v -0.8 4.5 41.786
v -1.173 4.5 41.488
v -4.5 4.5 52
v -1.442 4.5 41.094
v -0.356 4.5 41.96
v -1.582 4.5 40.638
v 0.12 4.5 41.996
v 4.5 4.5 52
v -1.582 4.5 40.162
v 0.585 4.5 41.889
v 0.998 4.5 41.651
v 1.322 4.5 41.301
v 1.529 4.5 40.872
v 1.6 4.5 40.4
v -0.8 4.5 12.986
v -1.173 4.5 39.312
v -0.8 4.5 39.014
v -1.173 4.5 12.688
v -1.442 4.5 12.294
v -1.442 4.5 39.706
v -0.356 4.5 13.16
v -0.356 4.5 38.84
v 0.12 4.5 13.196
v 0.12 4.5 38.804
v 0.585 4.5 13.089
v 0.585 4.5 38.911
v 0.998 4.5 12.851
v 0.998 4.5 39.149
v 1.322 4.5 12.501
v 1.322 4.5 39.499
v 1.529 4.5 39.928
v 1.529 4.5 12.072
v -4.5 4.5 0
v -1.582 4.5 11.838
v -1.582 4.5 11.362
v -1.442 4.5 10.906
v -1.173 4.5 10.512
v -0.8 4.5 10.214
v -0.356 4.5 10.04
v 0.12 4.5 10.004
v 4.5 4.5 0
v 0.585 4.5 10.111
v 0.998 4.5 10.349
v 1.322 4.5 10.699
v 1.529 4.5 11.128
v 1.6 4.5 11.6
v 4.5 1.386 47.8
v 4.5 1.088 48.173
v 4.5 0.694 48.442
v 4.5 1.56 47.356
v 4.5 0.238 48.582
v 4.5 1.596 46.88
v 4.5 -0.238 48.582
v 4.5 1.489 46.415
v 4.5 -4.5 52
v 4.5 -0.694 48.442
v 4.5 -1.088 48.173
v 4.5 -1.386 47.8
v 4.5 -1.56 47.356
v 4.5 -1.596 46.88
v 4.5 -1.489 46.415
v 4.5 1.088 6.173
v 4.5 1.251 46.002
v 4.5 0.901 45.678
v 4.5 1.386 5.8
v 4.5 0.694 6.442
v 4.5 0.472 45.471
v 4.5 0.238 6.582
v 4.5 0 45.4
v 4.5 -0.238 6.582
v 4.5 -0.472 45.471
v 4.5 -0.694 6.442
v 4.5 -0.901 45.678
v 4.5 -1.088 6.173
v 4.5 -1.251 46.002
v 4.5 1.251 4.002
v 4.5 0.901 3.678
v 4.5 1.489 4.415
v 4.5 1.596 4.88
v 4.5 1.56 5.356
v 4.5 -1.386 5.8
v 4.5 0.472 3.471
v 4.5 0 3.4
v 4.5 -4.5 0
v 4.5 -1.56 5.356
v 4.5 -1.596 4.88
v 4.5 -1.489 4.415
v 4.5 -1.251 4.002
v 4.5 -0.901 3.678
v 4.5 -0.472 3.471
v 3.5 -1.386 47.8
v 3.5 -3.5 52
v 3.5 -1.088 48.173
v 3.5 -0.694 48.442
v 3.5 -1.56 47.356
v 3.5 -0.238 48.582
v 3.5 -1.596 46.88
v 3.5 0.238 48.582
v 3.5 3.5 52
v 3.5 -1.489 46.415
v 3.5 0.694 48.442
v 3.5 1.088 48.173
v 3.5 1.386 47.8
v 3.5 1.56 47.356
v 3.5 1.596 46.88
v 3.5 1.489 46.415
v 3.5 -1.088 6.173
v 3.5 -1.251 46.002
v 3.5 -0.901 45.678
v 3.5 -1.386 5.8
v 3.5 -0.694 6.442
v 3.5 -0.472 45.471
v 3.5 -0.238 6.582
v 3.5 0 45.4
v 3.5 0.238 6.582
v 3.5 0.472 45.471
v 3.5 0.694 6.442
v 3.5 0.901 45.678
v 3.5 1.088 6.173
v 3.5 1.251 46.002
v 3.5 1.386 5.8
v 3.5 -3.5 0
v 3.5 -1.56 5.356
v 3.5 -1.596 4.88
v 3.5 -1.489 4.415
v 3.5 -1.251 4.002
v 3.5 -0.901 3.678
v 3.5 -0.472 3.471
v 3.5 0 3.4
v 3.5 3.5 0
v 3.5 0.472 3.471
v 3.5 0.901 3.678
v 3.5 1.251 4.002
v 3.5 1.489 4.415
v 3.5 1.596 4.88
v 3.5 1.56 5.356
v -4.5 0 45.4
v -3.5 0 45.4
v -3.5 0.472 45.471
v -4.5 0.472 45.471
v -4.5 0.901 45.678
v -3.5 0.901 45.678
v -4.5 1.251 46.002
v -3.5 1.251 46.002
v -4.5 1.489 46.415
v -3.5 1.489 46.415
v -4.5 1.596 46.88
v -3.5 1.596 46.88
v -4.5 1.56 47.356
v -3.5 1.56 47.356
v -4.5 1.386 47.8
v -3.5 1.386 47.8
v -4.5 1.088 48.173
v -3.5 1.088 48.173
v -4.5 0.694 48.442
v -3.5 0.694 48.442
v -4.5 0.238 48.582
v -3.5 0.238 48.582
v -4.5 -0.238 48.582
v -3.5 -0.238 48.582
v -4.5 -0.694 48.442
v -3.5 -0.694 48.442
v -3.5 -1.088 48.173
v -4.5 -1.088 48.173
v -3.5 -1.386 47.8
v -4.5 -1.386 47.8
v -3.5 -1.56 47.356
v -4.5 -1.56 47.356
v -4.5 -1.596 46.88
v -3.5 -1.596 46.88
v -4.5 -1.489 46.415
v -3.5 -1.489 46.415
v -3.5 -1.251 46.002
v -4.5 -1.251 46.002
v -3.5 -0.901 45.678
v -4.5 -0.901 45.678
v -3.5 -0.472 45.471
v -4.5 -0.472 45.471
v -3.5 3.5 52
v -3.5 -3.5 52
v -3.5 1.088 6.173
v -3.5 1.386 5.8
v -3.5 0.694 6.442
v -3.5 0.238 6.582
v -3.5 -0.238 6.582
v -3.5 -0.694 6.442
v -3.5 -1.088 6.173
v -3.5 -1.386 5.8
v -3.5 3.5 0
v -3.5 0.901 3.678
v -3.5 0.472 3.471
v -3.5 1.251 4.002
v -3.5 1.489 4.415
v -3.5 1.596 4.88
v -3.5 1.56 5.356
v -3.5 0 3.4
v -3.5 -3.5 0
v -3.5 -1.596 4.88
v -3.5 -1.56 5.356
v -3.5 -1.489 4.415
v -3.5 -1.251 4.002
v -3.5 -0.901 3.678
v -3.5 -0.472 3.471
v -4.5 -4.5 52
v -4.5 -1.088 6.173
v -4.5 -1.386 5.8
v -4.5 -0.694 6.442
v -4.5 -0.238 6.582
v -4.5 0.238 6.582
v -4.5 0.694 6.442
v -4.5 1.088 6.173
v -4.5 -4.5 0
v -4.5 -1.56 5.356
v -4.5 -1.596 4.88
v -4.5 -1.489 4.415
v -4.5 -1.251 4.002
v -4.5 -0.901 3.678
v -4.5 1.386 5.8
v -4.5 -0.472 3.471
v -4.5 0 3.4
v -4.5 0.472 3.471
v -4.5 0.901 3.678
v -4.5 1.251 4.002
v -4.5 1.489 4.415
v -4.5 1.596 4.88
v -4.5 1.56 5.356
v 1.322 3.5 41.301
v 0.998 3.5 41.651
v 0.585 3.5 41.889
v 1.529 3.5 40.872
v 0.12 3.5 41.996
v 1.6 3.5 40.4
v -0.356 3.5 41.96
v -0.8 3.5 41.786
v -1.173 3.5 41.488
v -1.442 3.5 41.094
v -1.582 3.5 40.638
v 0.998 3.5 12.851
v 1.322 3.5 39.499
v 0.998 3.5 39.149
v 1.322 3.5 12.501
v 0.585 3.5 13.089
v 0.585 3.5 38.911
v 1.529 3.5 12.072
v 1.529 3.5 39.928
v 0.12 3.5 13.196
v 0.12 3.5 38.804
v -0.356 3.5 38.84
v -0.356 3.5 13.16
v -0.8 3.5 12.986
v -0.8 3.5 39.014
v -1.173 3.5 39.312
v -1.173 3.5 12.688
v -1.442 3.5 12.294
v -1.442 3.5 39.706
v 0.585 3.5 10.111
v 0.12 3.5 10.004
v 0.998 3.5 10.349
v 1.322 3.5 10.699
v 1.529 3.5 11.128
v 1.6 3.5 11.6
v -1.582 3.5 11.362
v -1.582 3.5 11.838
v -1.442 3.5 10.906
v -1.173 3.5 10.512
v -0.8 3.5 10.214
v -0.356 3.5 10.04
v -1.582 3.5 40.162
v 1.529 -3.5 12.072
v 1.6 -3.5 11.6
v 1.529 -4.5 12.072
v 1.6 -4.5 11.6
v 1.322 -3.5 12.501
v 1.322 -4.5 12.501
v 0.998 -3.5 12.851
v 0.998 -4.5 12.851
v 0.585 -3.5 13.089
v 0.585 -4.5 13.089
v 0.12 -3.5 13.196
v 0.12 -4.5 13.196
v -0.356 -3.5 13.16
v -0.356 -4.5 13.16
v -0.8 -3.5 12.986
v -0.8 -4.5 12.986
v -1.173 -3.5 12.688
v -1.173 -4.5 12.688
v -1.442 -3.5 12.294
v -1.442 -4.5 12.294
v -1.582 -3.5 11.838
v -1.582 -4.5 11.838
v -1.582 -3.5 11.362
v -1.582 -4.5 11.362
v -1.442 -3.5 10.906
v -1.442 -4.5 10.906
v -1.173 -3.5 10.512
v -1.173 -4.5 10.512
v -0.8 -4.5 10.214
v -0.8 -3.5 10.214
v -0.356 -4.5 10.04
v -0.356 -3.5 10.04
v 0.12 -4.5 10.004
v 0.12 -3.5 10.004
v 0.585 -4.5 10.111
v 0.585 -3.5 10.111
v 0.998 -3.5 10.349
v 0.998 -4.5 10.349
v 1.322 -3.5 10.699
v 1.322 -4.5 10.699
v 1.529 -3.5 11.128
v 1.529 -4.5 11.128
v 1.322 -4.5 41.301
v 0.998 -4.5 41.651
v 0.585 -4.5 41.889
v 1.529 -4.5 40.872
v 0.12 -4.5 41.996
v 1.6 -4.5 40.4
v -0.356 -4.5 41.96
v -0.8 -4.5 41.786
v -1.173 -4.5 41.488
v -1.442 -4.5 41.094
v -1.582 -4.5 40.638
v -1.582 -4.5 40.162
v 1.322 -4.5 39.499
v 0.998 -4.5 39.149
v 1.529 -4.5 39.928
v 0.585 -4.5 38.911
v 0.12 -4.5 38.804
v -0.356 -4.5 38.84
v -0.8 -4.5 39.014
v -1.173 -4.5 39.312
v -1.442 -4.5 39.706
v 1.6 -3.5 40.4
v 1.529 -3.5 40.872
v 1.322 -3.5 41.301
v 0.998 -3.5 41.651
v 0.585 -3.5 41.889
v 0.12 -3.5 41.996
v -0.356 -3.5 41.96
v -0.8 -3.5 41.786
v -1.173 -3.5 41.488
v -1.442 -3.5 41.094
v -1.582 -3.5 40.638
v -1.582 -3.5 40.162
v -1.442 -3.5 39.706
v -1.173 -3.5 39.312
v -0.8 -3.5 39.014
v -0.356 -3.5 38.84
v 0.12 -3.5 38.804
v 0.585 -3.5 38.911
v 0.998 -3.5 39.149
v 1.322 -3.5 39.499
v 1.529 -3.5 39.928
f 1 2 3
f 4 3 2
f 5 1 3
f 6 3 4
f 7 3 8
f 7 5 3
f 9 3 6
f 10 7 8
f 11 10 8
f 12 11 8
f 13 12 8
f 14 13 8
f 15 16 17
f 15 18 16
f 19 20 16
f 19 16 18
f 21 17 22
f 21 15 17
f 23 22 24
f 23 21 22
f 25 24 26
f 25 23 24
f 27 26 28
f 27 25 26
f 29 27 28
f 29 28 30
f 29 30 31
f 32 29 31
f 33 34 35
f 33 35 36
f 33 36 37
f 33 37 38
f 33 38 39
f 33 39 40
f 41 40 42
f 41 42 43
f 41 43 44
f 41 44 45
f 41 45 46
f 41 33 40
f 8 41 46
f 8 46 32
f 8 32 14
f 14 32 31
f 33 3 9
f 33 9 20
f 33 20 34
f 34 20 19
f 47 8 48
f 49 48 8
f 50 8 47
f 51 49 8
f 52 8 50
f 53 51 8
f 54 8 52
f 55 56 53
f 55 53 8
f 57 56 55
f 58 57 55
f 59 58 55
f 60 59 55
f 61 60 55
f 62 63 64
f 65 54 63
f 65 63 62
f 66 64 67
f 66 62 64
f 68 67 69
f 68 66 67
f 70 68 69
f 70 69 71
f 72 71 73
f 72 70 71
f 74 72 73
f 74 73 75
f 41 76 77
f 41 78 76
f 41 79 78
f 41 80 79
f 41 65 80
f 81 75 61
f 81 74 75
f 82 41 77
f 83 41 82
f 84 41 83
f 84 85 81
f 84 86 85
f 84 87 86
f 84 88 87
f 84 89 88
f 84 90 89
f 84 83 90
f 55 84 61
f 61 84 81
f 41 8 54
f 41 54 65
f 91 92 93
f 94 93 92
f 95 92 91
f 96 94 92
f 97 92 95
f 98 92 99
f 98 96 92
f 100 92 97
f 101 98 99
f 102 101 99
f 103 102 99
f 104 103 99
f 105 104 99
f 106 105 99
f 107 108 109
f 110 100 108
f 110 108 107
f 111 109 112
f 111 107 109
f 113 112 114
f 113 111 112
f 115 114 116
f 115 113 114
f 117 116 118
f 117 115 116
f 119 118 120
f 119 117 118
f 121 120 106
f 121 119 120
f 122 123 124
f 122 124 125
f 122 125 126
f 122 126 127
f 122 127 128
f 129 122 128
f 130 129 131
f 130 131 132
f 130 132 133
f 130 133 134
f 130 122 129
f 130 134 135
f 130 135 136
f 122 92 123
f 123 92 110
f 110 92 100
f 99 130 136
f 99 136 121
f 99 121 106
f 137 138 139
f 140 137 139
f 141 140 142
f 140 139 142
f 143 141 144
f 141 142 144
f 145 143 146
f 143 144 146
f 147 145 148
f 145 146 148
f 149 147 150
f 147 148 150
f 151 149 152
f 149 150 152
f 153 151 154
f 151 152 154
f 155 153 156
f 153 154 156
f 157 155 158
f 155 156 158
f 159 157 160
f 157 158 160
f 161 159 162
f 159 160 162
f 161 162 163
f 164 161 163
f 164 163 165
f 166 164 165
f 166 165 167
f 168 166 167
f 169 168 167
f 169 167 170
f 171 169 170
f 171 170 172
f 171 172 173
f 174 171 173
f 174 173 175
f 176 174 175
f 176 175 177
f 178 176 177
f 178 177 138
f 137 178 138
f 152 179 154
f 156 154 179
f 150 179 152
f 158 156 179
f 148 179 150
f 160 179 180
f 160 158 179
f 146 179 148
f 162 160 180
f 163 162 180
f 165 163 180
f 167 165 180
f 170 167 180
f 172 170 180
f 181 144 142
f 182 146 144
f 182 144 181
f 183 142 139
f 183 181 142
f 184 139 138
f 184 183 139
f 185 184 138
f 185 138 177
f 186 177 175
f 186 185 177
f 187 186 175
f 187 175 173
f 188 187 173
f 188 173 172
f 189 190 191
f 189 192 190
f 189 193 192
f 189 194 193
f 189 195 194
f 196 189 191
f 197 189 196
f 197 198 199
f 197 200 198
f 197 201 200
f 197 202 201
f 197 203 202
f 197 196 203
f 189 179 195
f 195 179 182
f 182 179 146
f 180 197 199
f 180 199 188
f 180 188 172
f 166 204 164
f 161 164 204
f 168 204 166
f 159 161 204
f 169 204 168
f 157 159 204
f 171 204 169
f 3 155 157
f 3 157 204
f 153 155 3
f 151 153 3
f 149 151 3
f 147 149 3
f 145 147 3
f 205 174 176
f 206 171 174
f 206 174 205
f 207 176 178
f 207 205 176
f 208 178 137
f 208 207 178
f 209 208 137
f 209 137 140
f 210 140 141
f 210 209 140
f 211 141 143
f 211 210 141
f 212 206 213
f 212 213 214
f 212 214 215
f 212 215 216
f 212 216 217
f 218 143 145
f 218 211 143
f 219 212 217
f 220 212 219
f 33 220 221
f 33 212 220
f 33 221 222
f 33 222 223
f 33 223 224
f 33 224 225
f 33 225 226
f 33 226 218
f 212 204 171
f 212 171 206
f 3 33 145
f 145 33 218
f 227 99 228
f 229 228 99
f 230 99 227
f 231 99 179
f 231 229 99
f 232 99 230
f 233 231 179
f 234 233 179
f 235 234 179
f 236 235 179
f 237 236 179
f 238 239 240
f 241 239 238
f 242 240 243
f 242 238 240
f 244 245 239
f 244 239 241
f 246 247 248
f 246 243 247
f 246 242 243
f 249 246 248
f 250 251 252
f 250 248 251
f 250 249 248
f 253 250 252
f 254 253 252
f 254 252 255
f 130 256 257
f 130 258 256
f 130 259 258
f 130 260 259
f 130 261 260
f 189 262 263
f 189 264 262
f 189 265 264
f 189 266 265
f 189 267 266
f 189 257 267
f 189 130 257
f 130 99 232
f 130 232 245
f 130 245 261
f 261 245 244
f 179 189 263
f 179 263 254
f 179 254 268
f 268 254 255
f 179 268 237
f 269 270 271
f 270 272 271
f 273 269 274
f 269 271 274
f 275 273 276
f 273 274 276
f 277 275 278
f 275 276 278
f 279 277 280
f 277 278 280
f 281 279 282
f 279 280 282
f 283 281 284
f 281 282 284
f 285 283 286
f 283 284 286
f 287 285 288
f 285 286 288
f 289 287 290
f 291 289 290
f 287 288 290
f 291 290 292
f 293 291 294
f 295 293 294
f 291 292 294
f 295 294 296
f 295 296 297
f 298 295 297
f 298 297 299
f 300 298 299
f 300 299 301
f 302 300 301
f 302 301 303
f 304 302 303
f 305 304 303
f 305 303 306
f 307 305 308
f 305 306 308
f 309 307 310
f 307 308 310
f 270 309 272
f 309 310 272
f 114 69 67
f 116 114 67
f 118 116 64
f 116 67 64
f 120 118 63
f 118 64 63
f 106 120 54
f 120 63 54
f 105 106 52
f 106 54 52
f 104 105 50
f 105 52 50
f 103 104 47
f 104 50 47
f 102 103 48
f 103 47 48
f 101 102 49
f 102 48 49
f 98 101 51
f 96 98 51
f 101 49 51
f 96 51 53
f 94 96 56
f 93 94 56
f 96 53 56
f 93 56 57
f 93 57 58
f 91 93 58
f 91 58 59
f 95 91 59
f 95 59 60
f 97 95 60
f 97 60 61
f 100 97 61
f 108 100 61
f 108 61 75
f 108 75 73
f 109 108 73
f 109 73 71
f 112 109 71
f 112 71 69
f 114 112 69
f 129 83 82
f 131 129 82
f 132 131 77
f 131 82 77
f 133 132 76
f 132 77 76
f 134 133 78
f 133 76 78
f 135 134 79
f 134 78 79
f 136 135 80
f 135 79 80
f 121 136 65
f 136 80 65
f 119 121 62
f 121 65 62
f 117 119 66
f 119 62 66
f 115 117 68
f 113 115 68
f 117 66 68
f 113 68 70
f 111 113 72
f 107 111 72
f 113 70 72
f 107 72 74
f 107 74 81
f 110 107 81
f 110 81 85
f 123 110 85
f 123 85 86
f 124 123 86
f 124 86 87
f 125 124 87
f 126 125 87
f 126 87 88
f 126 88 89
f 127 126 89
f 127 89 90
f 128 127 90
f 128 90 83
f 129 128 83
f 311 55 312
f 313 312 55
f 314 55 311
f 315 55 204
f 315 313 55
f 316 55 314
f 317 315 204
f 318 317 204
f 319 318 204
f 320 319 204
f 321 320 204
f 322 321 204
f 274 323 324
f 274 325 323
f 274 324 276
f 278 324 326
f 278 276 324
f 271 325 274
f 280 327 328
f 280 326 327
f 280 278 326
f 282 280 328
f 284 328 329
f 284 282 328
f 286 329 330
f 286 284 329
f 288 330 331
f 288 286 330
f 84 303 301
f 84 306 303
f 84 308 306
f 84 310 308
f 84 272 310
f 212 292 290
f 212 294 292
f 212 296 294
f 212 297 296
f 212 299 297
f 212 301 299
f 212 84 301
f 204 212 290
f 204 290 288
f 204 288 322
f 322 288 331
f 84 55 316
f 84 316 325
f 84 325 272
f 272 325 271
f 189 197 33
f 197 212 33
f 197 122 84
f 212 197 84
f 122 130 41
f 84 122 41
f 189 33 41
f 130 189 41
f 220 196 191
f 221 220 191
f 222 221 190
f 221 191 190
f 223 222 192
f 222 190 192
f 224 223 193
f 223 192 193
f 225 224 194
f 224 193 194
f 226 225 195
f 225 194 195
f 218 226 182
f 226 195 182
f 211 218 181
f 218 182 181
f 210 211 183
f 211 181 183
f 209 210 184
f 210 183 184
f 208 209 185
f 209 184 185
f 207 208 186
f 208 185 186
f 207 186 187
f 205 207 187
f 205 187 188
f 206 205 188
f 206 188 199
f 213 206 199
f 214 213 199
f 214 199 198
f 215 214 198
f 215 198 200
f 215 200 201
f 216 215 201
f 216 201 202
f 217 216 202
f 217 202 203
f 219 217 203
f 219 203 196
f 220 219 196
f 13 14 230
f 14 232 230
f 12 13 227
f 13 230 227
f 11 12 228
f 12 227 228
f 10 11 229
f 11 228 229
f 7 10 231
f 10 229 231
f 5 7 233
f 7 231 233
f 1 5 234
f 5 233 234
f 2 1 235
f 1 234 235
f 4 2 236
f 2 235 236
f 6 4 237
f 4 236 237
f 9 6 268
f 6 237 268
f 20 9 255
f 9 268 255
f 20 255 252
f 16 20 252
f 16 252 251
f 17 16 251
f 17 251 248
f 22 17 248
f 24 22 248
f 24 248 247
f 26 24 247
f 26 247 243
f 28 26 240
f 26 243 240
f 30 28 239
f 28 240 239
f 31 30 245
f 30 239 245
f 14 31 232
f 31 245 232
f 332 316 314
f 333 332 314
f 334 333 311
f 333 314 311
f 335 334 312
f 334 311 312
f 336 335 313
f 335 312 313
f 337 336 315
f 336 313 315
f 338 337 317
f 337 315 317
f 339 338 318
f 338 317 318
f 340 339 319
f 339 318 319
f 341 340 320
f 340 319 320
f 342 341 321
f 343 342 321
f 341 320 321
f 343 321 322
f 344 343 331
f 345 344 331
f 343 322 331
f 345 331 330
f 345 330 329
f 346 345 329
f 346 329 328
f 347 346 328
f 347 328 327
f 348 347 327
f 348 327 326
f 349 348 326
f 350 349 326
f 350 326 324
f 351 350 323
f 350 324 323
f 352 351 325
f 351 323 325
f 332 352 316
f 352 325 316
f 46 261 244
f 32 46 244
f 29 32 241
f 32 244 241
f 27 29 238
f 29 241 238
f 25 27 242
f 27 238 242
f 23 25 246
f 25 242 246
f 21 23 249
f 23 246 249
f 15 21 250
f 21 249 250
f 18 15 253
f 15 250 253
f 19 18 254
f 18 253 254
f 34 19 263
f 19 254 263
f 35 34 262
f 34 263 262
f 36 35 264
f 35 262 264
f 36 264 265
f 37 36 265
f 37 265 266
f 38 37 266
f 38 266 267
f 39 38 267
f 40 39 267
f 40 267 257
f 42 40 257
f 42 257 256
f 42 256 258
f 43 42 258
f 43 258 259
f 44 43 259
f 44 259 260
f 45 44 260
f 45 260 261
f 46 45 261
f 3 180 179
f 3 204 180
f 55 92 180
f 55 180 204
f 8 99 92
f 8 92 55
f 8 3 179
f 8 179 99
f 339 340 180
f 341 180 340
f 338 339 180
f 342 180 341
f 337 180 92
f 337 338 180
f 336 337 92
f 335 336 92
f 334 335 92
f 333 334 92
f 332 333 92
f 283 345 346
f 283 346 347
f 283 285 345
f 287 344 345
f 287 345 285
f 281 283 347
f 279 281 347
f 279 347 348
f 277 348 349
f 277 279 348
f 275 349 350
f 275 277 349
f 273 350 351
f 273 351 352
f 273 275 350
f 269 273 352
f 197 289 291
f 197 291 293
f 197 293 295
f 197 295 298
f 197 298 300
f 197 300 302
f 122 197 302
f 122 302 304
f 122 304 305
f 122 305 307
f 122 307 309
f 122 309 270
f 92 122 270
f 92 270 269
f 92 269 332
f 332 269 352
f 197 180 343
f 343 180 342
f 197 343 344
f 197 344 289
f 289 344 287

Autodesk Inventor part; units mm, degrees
ref_plane "YZ Plane" through (0, 0, 0) normal (1, 0, 0) x (0, 1, 0)
ref_plane "XZ Plane" through (0, 0, 0) normal (0, 1, 0) x (-1, 0, 0)
ref_plane "XY Plane" through (0, 0, 0) normal (0, 0, 1) x (1, 0, 0)
sketch "スケッチ1" plane through (0, 0, 0) normal (0, 0, 1) x (1, 0, 0)
  line L0 (4.5, -4.5) -> (-4.5, -4.5)
  line L1 (-4.5, -4.5) -> (-4.5, 4.5)
  line L2 (-4.5, 4.5) -> (4.5, 4.5)
  line L3 (4.5, 4.5) -> (4.5, -4.5)
  line L4 (4.5, -4.5) -> (-4.5, 4.5) construction
  line L5 (-4.5, -4.5) -> (4.5, 4.5) construction
  line L6 (3.5, 3.5) -> (-3.5, 3.5)
  line L7 (-3.5, 3.5) -> (-3.5, -3.5)
  line L8 (-3.5, -3.5) -> (3.5, -3.5)
  line L9 (3.5, -3.5) -> (3.5, 3.5)
  point P0 (0, 0)
  dimension "d0" = 9
  dimension "d1" = 9
  dimension "d2" = 1
extrude "押し出し1" add sketch "スケッチ1" along normal blind 52
sketch "スケッチ3" plane through (4.5, -4.5, 0) normal (1, 0, 0) x (0, 0, -1)
  line L0 (0, 9) -> (0, 0) projected
  line L1 (0, 9) -> (-52, 9) projected
  line L2 (-52, 0) -> (-52, 9) projected
  line L3 (0, 0) -> (-52, 0) projected
  line L4 (-52, 4.5) -> (0, 4.5) construction
  line L5 (-26, 4.5) -> (-26, 9) construction
  circle A0 centre (-47, 4.5) radius 1.6
  circle A1 centre (-5, 4.5) radius 1.6
  dimension "d9" = 3.2
  dimension "d10" = 5
extrude "押し出し3" cut sketch "スケッチ3" against normal through all contours A0 | A1
sketch "スケッチ4" plane through (-4.5, -4.5, 0) normal (0, -1, 0) x (1, 0, 0)
  line L0 (9, 0) -> (0, 0) projected
  line L1 (9, 0) -> (9, 52) projected
  line L2 (0, 52) -> (9, 52) projected
  line L3 (0, 0) -> (0, 52) projected
  line L4 (9, 48.6) -> (9, 45.4) projected
  line L5 (8, 45.4) -> (8, 48.6) projected
  line L6 (0, 48.6) -> (0, 45.4) projected
  line L7 (1, 48.6) -> (1, 45.4) projected
  line L8 (9, 6.6) -> (9, 3.4) projected
  line L9 (8, 3.4) -> (8, 6.6) projected
  line L10 (1, 6.6) -> (1, 3.4) projected
  line L11 (4.5, 52) -> (4.5, 0) construction
  line L12 (9, 45.4) -> (0, 45.4)
  circle A0 centre (4.5, 40.4) radius 1.6
  line L13 (9, 26) -> (0, 26) construction
  circle A1 centre (4.5, 11.6) radius 1.6
  dimension "d13" = 3.2
  dimension "d14" = 5
  dimension "d15" = 4.5
extrude "押し出し4" cut sketch "スケッチ4" against normal through all contours A0 | A1
properties part number "型" material "アルミニウム 2014-T6"
